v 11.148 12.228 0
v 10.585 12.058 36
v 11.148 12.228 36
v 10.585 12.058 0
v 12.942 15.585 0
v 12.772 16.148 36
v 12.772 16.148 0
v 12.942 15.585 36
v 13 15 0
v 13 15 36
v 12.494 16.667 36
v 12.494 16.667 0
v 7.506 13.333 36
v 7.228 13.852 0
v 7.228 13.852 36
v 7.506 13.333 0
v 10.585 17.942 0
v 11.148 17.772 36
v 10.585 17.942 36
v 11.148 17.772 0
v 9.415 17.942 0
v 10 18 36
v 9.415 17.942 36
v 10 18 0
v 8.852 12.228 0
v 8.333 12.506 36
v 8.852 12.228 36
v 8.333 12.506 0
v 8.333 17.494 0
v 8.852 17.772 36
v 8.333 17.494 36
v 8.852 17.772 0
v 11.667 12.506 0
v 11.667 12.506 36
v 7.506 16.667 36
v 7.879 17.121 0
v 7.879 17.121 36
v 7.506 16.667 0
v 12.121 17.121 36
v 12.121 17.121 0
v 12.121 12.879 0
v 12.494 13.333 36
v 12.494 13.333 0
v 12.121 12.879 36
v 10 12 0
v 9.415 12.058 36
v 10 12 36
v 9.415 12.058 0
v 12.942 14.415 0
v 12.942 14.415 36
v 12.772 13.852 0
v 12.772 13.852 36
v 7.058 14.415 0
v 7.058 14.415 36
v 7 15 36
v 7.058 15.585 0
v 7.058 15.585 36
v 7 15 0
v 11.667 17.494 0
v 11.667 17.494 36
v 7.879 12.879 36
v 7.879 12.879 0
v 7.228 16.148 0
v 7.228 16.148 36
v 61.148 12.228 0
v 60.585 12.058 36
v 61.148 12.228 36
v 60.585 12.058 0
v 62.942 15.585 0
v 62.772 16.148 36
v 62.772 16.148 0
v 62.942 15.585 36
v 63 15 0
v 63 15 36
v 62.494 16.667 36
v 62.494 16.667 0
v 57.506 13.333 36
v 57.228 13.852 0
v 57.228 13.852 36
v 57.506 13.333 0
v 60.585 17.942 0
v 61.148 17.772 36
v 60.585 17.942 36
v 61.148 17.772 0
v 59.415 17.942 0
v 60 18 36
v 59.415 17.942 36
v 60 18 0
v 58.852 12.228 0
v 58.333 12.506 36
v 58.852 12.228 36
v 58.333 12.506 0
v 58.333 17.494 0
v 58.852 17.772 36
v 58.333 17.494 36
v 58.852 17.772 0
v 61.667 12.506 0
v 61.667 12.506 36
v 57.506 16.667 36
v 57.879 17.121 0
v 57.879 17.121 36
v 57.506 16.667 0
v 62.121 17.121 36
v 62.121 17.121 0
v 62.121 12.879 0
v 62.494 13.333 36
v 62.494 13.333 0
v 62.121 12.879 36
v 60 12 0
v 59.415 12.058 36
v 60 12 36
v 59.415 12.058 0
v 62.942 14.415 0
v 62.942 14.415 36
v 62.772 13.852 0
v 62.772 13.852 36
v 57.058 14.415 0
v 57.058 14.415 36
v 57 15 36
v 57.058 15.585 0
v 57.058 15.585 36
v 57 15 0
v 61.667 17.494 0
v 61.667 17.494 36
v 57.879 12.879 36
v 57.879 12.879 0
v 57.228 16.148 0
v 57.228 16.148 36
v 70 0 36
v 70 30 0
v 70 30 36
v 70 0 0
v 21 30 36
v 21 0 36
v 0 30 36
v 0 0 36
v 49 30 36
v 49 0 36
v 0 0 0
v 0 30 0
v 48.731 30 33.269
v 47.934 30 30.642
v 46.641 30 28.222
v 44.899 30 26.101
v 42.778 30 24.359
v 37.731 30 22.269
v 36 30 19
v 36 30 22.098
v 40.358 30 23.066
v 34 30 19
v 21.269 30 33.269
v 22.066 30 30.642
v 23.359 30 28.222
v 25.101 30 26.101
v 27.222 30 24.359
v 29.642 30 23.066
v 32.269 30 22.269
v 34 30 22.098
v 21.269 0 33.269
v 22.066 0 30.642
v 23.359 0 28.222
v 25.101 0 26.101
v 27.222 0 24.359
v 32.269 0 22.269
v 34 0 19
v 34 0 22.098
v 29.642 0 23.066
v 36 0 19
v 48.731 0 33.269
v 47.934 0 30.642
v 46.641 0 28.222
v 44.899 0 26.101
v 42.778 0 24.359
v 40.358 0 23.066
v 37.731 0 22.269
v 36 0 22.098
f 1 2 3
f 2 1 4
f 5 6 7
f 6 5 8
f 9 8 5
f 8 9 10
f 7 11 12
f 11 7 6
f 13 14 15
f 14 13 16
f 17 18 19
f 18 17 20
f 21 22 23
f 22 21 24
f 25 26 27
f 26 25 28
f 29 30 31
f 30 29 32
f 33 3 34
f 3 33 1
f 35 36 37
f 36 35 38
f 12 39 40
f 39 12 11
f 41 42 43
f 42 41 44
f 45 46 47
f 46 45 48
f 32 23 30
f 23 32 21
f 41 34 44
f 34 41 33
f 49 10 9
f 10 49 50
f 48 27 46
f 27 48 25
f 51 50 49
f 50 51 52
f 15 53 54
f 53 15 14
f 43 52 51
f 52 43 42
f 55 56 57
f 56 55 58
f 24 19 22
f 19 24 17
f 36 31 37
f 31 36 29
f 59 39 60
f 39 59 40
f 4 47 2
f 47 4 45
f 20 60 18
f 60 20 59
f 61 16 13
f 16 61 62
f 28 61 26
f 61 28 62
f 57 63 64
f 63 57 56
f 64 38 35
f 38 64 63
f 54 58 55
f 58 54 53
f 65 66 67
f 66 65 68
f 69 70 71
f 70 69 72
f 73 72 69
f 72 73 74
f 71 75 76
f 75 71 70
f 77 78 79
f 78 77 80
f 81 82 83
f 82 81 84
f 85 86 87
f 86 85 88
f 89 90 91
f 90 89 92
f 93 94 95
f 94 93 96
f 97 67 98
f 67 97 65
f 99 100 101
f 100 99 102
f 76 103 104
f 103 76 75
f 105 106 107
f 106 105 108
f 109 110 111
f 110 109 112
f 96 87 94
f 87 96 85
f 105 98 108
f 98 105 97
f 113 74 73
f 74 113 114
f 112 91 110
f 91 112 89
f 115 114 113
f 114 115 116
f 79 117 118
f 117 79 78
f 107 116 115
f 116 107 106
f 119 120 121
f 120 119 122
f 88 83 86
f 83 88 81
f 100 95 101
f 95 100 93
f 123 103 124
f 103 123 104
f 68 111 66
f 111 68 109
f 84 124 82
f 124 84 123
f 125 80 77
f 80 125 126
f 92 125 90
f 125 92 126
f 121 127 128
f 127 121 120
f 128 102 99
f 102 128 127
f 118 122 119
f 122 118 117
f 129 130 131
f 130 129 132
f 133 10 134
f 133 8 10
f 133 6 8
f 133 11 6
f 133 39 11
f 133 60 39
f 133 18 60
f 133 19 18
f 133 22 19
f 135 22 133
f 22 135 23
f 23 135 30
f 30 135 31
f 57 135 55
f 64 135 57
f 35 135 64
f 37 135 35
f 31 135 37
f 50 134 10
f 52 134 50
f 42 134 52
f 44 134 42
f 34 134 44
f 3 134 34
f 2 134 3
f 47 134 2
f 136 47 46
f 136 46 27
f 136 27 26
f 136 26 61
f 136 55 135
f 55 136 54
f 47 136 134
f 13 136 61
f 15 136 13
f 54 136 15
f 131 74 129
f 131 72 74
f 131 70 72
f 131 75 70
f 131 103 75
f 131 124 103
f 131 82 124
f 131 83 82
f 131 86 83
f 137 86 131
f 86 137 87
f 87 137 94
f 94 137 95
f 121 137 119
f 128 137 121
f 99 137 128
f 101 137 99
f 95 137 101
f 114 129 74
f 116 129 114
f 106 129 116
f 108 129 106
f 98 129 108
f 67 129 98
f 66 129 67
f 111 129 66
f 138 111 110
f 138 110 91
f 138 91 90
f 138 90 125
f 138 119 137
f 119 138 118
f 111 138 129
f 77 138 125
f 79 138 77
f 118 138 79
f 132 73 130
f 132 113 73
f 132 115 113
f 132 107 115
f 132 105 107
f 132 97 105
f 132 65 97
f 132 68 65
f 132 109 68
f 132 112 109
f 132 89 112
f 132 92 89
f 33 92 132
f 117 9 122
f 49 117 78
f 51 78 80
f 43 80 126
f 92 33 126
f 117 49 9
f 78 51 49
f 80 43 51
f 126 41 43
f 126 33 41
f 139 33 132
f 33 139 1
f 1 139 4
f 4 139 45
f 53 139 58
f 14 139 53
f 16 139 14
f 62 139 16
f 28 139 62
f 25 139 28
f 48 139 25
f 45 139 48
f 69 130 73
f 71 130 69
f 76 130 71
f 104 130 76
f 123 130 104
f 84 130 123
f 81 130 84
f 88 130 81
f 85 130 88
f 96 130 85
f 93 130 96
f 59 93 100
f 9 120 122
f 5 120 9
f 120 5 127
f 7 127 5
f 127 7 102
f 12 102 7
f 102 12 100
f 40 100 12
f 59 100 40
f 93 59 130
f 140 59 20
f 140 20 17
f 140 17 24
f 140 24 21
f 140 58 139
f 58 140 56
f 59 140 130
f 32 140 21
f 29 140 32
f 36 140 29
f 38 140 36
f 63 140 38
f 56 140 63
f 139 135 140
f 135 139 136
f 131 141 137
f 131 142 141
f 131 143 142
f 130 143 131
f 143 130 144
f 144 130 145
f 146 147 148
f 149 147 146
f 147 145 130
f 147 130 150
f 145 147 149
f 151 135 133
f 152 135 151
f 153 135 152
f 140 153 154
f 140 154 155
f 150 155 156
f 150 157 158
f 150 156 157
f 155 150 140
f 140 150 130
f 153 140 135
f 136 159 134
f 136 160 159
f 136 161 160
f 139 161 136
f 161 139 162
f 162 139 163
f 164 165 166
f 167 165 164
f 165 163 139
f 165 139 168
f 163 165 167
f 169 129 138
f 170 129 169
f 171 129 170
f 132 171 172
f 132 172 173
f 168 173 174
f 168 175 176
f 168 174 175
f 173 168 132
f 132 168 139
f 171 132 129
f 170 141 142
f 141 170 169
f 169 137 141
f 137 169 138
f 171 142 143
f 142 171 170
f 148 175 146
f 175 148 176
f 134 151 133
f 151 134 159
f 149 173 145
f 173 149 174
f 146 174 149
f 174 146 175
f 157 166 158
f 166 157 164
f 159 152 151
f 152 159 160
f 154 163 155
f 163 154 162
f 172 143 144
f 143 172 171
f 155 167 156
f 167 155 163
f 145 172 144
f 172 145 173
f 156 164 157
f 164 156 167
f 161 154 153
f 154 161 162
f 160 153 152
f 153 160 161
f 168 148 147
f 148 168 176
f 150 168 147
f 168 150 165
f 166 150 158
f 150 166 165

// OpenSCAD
$fn = 32;

// ----------------------------------------------------------------------
// Saddle clamp: split shaft clamp
// ----------------------------------------------------------------------

// --- parameters (mm) ---
blk_l = 70;               // block length, X
blk_w = 30;               // block width, Y
blk_h = 36;               // block height
clamp_r = 14;             // shaft groove radius
hole_r = 3;               // bolt hole radius
hole_m = 10;              // bolt hole margin from the ends
saw_w = 2;                // saw kerf width

saw_depth = clamp_r + 3;  // saw kerf depth

difference() {
  cube([blk_l, blk_w, blk_h]);
  translate([blk_l / 2, -1, blk_h])
    rotate([-90, 0, 0])
      cylinder(h = blk_w + 2, r = clamp_r);
  for (sx = [0, 1])
    translate([sx ? blk_l - hole_m : hole_m, blk_w / 2, -1])
      cylinder(r = hole_r, h = blk_h + 2);
  translate([blk_l / 2 - saw_w / 2, -1, blk_h - saw_depth])
    cube([saw_w, blk_w + 2, saw_depth + 1]);
}
